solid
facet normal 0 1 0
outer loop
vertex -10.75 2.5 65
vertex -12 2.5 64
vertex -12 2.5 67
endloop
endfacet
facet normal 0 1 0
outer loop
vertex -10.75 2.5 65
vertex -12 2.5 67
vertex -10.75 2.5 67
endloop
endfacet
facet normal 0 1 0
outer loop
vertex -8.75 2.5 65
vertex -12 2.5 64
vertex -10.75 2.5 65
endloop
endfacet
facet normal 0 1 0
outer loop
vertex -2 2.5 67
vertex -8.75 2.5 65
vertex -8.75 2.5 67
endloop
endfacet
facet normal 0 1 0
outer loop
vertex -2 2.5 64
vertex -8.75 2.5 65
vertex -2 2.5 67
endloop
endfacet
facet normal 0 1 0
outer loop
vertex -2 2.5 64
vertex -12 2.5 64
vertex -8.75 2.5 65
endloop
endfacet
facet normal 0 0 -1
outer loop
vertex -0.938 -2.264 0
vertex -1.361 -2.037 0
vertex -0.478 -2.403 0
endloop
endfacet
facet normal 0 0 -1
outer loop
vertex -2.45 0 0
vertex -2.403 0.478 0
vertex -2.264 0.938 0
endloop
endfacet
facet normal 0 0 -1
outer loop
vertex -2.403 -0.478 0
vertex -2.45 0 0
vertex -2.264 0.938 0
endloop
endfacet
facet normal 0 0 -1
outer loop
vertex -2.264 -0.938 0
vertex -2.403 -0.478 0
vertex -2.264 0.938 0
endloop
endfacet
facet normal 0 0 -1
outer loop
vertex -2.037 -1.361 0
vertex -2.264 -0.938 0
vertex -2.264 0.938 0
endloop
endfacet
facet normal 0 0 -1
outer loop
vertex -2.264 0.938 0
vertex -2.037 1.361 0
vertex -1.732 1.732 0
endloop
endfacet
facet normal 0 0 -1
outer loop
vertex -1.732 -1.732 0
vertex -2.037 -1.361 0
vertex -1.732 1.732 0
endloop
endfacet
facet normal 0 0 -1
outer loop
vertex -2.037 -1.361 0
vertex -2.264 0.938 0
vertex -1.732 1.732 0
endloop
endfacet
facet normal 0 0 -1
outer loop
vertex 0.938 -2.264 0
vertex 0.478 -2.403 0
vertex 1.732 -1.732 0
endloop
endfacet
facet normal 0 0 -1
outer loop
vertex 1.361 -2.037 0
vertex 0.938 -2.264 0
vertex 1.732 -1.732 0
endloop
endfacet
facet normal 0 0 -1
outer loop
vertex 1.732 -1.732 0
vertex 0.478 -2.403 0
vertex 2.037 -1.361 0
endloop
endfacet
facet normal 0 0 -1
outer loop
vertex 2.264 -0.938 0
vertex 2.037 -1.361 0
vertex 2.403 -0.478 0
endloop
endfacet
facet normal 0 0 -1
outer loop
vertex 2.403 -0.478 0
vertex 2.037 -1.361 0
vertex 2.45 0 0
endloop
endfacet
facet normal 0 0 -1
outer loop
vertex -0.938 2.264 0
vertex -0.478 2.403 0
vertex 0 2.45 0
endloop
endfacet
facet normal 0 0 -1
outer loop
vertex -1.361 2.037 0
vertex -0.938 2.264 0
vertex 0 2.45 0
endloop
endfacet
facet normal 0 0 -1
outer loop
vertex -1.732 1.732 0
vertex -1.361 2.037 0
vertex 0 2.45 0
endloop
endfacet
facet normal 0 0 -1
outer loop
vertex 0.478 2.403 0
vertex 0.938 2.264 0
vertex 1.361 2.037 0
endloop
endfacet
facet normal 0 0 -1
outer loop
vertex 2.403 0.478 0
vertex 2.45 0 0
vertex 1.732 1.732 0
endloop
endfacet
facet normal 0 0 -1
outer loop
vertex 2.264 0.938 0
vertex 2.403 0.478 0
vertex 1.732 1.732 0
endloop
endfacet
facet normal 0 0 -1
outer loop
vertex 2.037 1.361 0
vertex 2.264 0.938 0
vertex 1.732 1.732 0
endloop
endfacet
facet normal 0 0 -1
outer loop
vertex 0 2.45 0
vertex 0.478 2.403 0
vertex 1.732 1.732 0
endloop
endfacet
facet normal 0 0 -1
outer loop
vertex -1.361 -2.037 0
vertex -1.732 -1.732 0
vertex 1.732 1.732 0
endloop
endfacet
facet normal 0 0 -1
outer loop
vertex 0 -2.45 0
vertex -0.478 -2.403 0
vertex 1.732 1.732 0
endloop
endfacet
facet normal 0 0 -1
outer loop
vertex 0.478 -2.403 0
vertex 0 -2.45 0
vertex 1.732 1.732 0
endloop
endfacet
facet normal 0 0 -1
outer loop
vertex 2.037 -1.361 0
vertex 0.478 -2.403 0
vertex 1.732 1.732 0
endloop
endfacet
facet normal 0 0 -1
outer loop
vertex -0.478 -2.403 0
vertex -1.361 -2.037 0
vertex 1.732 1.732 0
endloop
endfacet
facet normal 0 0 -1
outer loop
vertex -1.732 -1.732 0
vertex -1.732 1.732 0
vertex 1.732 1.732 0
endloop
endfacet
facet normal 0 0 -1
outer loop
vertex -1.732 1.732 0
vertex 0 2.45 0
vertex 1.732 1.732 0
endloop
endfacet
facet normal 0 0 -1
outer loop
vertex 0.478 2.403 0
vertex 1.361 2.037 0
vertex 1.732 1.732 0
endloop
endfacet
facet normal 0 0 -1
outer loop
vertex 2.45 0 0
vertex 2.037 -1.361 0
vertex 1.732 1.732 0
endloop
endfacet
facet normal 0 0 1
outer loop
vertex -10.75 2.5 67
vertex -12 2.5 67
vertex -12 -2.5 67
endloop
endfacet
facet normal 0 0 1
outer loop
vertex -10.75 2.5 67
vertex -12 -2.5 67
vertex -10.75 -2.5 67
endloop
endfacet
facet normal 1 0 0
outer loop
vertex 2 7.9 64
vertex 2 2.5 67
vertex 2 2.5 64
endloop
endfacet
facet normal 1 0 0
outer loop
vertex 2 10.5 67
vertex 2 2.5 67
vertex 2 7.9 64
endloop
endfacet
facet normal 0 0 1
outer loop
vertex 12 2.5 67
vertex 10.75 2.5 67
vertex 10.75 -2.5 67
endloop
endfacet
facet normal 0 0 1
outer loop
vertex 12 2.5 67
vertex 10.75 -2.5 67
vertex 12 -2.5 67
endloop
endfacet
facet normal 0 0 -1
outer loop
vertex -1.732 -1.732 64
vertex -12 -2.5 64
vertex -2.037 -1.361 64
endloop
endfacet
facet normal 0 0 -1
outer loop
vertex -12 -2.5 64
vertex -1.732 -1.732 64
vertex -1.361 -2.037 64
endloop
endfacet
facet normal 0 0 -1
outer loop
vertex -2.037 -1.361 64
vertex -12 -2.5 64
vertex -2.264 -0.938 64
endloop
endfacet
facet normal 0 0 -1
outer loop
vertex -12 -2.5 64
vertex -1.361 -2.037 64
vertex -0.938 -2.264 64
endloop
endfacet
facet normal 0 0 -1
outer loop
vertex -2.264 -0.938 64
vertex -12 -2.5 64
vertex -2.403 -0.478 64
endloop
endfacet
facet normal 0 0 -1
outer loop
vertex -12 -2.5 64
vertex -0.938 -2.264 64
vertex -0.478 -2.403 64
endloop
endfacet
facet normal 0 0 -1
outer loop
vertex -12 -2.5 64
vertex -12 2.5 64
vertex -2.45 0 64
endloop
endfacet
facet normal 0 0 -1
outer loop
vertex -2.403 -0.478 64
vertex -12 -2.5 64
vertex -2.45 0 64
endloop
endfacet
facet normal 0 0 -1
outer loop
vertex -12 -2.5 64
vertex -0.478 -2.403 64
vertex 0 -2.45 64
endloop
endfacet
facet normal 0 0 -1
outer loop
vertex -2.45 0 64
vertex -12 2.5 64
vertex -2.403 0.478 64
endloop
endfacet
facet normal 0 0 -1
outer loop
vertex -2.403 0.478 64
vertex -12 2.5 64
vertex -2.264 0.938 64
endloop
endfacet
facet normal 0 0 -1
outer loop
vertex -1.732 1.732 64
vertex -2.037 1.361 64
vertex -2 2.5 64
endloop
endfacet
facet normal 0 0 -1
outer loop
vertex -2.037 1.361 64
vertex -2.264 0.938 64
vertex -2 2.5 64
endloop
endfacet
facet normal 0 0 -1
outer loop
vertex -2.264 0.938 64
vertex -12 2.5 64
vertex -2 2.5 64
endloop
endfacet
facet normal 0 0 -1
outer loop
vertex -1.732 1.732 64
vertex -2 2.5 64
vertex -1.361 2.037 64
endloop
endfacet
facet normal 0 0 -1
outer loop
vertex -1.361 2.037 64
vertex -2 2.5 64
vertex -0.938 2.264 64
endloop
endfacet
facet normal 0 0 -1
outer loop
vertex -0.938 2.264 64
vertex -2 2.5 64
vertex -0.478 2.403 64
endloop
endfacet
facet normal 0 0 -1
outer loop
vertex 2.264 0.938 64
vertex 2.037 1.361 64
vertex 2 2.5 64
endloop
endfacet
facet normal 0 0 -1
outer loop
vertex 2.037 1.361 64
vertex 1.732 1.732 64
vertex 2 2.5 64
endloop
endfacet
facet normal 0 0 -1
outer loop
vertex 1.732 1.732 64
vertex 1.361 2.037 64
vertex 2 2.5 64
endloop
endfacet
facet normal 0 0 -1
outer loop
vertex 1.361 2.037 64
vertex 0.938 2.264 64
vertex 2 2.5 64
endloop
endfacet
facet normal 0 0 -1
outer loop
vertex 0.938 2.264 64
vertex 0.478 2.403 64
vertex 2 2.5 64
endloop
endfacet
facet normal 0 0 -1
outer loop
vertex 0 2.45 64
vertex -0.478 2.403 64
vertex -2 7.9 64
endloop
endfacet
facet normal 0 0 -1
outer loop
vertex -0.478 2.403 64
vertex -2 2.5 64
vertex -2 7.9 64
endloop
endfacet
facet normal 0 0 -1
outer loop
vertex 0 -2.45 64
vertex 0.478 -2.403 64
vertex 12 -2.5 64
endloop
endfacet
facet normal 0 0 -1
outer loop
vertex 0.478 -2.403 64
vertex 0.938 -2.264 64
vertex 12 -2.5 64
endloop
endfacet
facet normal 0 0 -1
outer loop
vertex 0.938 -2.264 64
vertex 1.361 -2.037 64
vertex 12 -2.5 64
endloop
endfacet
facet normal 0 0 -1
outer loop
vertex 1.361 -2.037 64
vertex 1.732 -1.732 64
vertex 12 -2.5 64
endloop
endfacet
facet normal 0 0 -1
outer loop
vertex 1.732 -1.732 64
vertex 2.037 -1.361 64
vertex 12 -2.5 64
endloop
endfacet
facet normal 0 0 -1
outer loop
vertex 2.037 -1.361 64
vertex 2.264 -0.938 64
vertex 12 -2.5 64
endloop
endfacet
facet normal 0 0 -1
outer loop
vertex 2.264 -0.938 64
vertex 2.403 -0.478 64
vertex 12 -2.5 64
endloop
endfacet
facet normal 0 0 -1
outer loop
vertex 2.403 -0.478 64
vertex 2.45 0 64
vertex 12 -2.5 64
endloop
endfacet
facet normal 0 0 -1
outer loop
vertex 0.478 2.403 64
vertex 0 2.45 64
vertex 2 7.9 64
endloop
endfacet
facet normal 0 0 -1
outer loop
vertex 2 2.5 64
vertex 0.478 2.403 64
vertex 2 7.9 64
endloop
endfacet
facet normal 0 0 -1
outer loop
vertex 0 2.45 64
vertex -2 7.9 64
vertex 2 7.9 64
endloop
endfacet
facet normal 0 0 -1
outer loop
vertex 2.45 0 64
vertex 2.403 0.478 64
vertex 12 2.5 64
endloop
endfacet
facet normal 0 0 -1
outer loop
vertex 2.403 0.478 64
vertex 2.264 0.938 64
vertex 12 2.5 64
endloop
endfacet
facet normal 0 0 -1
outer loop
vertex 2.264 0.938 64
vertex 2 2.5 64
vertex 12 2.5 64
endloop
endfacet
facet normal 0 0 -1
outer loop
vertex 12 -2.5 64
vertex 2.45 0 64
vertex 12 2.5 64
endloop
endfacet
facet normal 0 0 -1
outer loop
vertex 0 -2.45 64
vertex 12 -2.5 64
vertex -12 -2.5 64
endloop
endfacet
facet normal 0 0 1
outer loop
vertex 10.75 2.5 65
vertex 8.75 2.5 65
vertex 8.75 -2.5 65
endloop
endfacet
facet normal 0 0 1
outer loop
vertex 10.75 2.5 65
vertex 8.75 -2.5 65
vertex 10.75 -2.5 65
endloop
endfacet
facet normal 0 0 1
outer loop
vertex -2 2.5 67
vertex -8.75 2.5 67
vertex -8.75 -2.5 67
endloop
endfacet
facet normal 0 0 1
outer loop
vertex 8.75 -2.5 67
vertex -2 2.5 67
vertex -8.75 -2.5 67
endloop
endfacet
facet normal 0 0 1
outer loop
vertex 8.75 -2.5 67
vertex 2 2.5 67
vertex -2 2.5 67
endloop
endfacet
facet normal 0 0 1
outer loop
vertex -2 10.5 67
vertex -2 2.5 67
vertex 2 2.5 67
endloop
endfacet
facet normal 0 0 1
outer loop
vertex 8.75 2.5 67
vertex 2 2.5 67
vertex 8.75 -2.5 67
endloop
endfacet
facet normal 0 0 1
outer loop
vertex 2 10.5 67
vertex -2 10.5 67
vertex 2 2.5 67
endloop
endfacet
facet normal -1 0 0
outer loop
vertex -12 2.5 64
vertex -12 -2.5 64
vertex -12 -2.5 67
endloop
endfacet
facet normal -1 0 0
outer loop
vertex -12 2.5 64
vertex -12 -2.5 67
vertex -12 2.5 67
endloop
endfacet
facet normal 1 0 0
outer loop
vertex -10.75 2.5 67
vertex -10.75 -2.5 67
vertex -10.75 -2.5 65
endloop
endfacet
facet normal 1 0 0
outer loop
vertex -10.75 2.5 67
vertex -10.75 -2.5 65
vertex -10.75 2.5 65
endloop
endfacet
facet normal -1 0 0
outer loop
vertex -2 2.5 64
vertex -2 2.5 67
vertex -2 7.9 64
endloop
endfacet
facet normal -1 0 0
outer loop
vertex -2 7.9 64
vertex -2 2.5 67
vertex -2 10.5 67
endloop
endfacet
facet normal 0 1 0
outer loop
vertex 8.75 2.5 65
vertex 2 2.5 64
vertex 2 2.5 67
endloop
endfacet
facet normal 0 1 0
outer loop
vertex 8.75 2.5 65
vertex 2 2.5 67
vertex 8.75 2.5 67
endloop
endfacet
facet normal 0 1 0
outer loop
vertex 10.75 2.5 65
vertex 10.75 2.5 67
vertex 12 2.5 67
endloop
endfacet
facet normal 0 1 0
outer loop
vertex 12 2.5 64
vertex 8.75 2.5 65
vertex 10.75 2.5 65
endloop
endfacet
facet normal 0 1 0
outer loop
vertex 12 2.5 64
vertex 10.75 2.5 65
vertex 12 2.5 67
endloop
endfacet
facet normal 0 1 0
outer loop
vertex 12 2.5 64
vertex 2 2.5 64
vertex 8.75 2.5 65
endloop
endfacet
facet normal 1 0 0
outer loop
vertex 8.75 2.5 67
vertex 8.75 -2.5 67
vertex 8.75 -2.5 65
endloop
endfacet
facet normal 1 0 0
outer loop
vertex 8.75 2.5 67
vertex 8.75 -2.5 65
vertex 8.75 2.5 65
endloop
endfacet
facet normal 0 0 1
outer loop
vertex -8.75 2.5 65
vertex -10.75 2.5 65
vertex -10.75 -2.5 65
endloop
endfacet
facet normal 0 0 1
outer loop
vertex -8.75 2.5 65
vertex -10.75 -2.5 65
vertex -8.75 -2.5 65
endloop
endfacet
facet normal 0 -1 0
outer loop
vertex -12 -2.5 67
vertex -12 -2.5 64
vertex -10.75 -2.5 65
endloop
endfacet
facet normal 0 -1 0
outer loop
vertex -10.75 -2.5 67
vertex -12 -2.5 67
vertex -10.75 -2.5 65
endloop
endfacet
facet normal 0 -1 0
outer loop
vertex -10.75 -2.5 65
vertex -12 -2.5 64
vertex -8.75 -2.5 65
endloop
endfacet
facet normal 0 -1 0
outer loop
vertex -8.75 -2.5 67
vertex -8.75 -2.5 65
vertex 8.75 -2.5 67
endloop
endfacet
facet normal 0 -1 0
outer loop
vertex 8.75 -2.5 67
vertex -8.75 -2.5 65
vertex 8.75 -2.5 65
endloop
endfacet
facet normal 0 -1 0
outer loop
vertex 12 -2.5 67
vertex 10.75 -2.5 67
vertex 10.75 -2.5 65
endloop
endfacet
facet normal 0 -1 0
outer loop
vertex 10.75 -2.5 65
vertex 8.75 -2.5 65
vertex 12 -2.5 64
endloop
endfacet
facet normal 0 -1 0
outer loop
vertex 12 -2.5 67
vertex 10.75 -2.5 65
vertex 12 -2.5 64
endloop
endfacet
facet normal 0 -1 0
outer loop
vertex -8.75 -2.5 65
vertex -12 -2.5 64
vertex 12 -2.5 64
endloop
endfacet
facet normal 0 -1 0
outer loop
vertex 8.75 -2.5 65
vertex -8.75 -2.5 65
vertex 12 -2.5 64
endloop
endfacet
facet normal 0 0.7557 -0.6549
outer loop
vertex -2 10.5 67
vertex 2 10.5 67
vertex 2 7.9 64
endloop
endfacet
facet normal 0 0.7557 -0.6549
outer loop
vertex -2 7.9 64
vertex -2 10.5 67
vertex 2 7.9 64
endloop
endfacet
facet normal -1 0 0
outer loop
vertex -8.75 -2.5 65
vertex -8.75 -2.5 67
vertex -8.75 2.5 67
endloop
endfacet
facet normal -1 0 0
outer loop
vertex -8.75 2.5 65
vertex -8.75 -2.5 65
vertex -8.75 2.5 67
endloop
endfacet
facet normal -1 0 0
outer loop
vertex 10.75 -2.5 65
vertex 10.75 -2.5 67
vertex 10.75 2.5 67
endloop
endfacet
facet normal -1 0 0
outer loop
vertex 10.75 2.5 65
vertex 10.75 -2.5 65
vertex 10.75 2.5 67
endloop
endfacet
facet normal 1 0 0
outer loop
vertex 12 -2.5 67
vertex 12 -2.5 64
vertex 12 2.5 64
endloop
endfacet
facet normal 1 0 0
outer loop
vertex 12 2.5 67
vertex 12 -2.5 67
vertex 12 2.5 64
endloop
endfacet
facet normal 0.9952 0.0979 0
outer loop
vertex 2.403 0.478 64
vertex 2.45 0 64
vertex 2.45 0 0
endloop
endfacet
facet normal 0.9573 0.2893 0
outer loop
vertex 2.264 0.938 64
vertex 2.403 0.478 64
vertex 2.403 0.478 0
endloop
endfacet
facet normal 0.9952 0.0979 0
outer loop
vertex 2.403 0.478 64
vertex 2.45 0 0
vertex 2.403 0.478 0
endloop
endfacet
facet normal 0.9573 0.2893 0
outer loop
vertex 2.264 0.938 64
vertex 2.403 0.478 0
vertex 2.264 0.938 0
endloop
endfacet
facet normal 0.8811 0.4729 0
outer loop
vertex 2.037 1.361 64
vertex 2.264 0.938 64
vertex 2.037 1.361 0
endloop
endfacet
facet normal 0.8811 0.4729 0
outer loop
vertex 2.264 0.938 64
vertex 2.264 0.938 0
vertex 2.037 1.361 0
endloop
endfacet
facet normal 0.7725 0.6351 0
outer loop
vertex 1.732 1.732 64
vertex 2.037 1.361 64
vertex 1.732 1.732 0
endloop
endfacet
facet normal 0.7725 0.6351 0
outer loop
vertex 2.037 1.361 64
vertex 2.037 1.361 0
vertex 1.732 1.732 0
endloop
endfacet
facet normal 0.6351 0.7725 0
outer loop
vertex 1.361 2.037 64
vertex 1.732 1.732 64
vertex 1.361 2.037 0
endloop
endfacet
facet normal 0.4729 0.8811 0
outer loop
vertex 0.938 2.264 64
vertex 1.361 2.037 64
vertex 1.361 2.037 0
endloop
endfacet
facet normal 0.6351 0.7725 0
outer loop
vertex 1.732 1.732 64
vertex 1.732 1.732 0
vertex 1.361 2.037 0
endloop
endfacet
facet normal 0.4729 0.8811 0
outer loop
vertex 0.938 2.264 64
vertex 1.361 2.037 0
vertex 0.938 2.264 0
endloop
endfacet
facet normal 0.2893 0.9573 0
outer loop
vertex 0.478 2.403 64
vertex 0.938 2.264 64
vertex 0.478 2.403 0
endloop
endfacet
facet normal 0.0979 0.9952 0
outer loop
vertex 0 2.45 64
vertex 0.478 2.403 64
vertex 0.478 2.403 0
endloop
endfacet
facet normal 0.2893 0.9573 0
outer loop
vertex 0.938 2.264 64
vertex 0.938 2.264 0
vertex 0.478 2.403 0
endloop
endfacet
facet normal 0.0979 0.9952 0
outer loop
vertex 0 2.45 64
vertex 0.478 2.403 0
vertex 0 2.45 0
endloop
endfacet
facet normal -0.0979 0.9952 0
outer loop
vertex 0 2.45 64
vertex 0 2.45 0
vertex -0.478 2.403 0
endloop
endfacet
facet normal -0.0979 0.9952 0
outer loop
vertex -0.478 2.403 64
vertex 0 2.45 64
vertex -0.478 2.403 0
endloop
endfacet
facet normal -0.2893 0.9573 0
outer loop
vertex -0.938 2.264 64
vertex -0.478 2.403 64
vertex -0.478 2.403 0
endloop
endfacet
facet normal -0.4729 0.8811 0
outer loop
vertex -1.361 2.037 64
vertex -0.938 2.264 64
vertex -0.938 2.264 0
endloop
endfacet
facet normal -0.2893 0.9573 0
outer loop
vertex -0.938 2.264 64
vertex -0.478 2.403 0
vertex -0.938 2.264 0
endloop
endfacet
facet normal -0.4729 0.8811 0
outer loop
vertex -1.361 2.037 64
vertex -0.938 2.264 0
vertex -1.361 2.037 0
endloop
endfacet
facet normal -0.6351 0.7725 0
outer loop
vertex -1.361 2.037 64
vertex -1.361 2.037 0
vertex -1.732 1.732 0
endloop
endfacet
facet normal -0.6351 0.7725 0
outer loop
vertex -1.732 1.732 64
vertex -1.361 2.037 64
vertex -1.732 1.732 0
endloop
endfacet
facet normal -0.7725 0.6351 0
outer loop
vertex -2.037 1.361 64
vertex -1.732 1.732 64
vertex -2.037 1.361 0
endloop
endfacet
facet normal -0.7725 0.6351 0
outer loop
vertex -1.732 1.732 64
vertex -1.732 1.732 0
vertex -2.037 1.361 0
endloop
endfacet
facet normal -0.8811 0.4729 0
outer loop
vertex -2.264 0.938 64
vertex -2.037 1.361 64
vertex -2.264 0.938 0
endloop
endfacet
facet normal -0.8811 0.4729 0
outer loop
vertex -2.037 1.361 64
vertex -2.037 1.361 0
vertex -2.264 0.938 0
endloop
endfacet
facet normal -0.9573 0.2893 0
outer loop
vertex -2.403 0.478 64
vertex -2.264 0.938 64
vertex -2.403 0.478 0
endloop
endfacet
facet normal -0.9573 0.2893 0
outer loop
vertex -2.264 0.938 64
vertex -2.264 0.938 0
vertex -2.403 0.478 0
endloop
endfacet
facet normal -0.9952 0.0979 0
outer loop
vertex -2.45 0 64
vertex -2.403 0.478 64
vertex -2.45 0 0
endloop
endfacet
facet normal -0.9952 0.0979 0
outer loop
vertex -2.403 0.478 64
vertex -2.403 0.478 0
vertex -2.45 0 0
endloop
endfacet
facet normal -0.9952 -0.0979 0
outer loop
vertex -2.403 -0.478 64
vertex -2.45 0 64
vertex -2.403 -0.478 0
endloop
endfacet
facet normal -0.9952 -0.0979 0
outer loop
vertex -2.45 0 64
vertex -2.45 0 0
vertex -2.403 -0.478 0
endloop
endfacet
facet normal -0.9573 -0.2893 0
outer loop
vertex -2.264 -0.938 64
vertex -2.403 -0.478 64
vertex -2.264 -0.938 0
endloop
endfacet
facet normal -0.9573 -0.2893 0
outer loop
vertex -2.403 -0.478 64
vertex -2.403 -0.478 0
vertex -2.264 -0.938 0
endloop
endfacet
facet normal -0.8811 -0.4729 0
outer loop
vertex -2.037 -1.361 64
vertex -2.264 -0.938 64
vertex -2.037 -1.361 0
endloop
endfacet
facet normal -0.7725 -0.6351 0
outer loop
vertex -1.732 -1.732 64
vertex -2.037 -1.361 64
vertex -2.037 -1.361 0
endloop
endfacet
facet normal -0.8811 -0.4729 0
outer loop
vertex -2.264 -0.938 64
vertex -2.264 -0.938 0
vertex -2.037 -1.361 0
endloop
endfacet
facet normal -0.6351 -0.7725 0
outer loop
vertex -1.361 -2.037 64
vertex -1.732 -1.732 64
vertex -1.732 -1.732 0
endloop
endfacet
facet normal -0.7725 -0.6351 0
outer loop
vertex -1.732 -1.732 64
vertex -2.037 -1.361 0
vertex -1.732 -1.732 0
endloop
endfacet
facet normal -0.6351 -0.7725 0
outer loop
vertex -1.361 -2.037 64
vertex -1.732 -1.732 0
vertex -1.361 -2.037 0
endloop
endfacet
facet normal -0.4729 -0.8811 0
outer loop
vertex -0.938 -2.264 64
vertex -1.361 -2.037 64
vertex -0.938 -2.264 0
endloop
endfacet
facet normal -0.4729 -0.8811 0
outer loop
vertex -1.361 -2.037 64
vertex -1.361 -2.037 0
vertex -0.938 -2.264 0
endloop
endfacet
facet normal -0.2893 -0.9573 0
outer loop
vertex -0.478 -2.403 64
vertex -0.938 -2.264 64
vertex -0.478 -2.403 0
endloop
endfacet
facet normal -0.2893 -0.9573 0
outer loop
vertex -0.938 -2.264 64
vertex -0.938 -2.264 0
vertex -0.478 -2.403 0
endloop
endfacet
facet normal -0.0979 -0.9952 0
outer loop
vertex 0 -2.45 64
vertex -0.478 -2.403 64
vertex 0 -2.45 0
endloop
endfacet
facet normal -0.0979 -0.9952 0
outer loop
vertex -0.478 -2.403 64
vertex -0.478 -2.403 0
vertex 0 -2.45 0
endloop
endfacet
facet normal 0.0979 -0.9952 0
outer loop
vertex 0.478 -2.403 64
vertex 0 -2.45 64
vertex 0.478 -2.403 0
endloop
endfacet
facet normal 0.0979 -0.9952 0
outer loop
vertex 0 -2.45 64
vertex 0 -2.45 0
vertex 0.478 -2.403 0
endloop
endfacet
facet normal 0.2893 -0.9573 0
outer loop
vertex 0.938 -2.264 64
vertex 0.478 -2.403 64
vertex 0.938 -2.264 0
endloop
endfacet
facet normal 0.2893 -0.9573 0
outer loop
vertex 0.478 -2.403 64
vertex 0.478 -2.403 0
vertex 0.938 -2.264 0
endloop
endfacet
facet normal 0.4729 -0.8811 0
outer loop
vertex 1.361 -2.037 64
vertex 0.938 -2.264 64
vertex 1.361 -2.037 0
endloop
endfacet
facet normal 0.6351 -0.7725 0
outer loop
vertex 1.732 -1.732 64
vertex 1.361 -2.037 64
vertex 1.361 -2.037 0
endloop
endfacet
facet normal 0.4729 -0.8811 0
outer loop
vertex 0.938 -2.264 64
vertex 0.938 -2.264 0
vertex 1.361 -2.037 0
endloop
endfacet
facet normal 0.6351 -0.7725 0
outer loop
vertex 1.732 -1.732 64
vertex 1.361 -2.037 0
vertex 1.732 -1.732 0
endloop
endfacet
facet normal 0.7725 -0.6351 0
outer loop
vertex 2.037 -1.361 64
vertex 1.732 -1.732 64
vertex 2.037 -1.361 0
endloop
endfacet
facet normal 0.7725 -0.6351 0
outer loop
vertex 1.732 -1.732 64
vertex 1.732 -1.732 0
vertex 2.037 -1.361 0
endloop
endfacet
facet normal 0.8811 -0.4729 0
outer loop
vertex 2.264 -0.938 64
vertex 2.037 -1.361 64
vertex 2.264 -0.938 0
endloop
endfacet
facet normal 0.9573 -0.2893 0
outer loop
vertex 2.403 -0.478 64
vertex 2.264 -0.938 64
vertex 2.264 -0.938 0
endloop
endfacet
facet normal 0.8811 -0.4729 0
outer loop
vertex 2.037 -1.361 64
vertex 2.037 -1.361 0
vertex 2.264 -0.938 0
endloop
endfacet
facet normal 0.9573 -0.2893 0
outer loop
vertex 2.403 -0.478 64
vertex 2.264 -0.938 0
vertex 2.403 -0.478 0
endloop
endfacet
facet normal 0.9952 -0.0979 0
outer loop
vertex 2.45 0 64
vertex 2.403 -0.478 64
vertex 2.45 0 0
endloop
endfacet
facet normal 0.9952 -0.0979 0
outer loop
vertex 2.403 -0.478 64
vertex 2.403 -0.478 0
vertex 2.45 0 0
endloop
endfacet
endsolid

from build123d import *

# Parameters (mm, degrees)
SKETCH1_R           = 2.45
BOSS_EXTRUDE1_DEPTH = 64
SKETCH2_W           = 24
SKETCH2_H           = 5
BOSS_EXTRUDE2_DEPTH = 3
SKETCH3_W           = 2
SKETCH3_H           = 5
CUT_EXTRUDE2_DEPTH  = 2
SKETCH4_W           = 4
SKETCH4_H           = 8
BOSS_EXTRUDE3_DEPTH = 3
CUT_EXTRUDE3_REACH  = 71.248


with BuildPart() as part:
    # Sketch1 → Boss-Extrude1 (new body)
    with BuildSketch(Plane.XY):
        Circle(SKETCH1_R)
    extrude(amount=BOSS_EXTRUDE1_DEPTH)

    # Sketch2 → Boss-Extrude2 (add)
    with BuildSketch(Plane.XY.offset(64)):
        Rectangle(SKETCH2_W, SKETCH2_H)
    extrude(amount=BOSS_EXTRUDE2_DEPTH)

    # Sketch3 → Cut-Extrude2 (cut)
    with BuildSketch(Plane.XY.offset(67)):
        with Locations((9.75, 0)):
            Rectangle(SKETCH3_W, SKETCH3_H)
        with Locations((-9.75, 0)):
            Rectangle(SKETCH3_W, SKETCH3_H)
    extrude(amount=-CUT_EXTRUDE2_DEPTH, mode=Mode.SUBTRACT)

    # Sketch4 → Boss-Extrude3 (add)
    with BuildSketch(Plane.XY.offset(67)):
        with Locations((0, 6.5)):
            Rectangle(SKETCH4_W, SKETCH4_H)
    extrude(amount=-BOSS_EXTRUDE3_DEPTH)

    # Sketch5 → Cut-Extrude3 (cut, up to next)
    with BuildSketch(Plane(origin=(2, 0, 0), x_dir=(0, 0, -1), z_dir=(1, 0, 0)), mode=Mode.PRIVATE) as cut_extrude3_sk1:
        Polygon((-67, 10.5), (-64, 7.9), (-64, 10.5), align=None)
    cut_extrude3_tool1 = extrude(cut_extrude3_sk1.sketch, amount=-CUT_EXTRUDE3_REACH, mode=Mode.PRIVATE) & part.part
    add(cut_extrude3_tool1.solids().sort_by_distance((2, 9.633333, 65))[0], mode=Mode.SUBTRACT)


solid = part.part
